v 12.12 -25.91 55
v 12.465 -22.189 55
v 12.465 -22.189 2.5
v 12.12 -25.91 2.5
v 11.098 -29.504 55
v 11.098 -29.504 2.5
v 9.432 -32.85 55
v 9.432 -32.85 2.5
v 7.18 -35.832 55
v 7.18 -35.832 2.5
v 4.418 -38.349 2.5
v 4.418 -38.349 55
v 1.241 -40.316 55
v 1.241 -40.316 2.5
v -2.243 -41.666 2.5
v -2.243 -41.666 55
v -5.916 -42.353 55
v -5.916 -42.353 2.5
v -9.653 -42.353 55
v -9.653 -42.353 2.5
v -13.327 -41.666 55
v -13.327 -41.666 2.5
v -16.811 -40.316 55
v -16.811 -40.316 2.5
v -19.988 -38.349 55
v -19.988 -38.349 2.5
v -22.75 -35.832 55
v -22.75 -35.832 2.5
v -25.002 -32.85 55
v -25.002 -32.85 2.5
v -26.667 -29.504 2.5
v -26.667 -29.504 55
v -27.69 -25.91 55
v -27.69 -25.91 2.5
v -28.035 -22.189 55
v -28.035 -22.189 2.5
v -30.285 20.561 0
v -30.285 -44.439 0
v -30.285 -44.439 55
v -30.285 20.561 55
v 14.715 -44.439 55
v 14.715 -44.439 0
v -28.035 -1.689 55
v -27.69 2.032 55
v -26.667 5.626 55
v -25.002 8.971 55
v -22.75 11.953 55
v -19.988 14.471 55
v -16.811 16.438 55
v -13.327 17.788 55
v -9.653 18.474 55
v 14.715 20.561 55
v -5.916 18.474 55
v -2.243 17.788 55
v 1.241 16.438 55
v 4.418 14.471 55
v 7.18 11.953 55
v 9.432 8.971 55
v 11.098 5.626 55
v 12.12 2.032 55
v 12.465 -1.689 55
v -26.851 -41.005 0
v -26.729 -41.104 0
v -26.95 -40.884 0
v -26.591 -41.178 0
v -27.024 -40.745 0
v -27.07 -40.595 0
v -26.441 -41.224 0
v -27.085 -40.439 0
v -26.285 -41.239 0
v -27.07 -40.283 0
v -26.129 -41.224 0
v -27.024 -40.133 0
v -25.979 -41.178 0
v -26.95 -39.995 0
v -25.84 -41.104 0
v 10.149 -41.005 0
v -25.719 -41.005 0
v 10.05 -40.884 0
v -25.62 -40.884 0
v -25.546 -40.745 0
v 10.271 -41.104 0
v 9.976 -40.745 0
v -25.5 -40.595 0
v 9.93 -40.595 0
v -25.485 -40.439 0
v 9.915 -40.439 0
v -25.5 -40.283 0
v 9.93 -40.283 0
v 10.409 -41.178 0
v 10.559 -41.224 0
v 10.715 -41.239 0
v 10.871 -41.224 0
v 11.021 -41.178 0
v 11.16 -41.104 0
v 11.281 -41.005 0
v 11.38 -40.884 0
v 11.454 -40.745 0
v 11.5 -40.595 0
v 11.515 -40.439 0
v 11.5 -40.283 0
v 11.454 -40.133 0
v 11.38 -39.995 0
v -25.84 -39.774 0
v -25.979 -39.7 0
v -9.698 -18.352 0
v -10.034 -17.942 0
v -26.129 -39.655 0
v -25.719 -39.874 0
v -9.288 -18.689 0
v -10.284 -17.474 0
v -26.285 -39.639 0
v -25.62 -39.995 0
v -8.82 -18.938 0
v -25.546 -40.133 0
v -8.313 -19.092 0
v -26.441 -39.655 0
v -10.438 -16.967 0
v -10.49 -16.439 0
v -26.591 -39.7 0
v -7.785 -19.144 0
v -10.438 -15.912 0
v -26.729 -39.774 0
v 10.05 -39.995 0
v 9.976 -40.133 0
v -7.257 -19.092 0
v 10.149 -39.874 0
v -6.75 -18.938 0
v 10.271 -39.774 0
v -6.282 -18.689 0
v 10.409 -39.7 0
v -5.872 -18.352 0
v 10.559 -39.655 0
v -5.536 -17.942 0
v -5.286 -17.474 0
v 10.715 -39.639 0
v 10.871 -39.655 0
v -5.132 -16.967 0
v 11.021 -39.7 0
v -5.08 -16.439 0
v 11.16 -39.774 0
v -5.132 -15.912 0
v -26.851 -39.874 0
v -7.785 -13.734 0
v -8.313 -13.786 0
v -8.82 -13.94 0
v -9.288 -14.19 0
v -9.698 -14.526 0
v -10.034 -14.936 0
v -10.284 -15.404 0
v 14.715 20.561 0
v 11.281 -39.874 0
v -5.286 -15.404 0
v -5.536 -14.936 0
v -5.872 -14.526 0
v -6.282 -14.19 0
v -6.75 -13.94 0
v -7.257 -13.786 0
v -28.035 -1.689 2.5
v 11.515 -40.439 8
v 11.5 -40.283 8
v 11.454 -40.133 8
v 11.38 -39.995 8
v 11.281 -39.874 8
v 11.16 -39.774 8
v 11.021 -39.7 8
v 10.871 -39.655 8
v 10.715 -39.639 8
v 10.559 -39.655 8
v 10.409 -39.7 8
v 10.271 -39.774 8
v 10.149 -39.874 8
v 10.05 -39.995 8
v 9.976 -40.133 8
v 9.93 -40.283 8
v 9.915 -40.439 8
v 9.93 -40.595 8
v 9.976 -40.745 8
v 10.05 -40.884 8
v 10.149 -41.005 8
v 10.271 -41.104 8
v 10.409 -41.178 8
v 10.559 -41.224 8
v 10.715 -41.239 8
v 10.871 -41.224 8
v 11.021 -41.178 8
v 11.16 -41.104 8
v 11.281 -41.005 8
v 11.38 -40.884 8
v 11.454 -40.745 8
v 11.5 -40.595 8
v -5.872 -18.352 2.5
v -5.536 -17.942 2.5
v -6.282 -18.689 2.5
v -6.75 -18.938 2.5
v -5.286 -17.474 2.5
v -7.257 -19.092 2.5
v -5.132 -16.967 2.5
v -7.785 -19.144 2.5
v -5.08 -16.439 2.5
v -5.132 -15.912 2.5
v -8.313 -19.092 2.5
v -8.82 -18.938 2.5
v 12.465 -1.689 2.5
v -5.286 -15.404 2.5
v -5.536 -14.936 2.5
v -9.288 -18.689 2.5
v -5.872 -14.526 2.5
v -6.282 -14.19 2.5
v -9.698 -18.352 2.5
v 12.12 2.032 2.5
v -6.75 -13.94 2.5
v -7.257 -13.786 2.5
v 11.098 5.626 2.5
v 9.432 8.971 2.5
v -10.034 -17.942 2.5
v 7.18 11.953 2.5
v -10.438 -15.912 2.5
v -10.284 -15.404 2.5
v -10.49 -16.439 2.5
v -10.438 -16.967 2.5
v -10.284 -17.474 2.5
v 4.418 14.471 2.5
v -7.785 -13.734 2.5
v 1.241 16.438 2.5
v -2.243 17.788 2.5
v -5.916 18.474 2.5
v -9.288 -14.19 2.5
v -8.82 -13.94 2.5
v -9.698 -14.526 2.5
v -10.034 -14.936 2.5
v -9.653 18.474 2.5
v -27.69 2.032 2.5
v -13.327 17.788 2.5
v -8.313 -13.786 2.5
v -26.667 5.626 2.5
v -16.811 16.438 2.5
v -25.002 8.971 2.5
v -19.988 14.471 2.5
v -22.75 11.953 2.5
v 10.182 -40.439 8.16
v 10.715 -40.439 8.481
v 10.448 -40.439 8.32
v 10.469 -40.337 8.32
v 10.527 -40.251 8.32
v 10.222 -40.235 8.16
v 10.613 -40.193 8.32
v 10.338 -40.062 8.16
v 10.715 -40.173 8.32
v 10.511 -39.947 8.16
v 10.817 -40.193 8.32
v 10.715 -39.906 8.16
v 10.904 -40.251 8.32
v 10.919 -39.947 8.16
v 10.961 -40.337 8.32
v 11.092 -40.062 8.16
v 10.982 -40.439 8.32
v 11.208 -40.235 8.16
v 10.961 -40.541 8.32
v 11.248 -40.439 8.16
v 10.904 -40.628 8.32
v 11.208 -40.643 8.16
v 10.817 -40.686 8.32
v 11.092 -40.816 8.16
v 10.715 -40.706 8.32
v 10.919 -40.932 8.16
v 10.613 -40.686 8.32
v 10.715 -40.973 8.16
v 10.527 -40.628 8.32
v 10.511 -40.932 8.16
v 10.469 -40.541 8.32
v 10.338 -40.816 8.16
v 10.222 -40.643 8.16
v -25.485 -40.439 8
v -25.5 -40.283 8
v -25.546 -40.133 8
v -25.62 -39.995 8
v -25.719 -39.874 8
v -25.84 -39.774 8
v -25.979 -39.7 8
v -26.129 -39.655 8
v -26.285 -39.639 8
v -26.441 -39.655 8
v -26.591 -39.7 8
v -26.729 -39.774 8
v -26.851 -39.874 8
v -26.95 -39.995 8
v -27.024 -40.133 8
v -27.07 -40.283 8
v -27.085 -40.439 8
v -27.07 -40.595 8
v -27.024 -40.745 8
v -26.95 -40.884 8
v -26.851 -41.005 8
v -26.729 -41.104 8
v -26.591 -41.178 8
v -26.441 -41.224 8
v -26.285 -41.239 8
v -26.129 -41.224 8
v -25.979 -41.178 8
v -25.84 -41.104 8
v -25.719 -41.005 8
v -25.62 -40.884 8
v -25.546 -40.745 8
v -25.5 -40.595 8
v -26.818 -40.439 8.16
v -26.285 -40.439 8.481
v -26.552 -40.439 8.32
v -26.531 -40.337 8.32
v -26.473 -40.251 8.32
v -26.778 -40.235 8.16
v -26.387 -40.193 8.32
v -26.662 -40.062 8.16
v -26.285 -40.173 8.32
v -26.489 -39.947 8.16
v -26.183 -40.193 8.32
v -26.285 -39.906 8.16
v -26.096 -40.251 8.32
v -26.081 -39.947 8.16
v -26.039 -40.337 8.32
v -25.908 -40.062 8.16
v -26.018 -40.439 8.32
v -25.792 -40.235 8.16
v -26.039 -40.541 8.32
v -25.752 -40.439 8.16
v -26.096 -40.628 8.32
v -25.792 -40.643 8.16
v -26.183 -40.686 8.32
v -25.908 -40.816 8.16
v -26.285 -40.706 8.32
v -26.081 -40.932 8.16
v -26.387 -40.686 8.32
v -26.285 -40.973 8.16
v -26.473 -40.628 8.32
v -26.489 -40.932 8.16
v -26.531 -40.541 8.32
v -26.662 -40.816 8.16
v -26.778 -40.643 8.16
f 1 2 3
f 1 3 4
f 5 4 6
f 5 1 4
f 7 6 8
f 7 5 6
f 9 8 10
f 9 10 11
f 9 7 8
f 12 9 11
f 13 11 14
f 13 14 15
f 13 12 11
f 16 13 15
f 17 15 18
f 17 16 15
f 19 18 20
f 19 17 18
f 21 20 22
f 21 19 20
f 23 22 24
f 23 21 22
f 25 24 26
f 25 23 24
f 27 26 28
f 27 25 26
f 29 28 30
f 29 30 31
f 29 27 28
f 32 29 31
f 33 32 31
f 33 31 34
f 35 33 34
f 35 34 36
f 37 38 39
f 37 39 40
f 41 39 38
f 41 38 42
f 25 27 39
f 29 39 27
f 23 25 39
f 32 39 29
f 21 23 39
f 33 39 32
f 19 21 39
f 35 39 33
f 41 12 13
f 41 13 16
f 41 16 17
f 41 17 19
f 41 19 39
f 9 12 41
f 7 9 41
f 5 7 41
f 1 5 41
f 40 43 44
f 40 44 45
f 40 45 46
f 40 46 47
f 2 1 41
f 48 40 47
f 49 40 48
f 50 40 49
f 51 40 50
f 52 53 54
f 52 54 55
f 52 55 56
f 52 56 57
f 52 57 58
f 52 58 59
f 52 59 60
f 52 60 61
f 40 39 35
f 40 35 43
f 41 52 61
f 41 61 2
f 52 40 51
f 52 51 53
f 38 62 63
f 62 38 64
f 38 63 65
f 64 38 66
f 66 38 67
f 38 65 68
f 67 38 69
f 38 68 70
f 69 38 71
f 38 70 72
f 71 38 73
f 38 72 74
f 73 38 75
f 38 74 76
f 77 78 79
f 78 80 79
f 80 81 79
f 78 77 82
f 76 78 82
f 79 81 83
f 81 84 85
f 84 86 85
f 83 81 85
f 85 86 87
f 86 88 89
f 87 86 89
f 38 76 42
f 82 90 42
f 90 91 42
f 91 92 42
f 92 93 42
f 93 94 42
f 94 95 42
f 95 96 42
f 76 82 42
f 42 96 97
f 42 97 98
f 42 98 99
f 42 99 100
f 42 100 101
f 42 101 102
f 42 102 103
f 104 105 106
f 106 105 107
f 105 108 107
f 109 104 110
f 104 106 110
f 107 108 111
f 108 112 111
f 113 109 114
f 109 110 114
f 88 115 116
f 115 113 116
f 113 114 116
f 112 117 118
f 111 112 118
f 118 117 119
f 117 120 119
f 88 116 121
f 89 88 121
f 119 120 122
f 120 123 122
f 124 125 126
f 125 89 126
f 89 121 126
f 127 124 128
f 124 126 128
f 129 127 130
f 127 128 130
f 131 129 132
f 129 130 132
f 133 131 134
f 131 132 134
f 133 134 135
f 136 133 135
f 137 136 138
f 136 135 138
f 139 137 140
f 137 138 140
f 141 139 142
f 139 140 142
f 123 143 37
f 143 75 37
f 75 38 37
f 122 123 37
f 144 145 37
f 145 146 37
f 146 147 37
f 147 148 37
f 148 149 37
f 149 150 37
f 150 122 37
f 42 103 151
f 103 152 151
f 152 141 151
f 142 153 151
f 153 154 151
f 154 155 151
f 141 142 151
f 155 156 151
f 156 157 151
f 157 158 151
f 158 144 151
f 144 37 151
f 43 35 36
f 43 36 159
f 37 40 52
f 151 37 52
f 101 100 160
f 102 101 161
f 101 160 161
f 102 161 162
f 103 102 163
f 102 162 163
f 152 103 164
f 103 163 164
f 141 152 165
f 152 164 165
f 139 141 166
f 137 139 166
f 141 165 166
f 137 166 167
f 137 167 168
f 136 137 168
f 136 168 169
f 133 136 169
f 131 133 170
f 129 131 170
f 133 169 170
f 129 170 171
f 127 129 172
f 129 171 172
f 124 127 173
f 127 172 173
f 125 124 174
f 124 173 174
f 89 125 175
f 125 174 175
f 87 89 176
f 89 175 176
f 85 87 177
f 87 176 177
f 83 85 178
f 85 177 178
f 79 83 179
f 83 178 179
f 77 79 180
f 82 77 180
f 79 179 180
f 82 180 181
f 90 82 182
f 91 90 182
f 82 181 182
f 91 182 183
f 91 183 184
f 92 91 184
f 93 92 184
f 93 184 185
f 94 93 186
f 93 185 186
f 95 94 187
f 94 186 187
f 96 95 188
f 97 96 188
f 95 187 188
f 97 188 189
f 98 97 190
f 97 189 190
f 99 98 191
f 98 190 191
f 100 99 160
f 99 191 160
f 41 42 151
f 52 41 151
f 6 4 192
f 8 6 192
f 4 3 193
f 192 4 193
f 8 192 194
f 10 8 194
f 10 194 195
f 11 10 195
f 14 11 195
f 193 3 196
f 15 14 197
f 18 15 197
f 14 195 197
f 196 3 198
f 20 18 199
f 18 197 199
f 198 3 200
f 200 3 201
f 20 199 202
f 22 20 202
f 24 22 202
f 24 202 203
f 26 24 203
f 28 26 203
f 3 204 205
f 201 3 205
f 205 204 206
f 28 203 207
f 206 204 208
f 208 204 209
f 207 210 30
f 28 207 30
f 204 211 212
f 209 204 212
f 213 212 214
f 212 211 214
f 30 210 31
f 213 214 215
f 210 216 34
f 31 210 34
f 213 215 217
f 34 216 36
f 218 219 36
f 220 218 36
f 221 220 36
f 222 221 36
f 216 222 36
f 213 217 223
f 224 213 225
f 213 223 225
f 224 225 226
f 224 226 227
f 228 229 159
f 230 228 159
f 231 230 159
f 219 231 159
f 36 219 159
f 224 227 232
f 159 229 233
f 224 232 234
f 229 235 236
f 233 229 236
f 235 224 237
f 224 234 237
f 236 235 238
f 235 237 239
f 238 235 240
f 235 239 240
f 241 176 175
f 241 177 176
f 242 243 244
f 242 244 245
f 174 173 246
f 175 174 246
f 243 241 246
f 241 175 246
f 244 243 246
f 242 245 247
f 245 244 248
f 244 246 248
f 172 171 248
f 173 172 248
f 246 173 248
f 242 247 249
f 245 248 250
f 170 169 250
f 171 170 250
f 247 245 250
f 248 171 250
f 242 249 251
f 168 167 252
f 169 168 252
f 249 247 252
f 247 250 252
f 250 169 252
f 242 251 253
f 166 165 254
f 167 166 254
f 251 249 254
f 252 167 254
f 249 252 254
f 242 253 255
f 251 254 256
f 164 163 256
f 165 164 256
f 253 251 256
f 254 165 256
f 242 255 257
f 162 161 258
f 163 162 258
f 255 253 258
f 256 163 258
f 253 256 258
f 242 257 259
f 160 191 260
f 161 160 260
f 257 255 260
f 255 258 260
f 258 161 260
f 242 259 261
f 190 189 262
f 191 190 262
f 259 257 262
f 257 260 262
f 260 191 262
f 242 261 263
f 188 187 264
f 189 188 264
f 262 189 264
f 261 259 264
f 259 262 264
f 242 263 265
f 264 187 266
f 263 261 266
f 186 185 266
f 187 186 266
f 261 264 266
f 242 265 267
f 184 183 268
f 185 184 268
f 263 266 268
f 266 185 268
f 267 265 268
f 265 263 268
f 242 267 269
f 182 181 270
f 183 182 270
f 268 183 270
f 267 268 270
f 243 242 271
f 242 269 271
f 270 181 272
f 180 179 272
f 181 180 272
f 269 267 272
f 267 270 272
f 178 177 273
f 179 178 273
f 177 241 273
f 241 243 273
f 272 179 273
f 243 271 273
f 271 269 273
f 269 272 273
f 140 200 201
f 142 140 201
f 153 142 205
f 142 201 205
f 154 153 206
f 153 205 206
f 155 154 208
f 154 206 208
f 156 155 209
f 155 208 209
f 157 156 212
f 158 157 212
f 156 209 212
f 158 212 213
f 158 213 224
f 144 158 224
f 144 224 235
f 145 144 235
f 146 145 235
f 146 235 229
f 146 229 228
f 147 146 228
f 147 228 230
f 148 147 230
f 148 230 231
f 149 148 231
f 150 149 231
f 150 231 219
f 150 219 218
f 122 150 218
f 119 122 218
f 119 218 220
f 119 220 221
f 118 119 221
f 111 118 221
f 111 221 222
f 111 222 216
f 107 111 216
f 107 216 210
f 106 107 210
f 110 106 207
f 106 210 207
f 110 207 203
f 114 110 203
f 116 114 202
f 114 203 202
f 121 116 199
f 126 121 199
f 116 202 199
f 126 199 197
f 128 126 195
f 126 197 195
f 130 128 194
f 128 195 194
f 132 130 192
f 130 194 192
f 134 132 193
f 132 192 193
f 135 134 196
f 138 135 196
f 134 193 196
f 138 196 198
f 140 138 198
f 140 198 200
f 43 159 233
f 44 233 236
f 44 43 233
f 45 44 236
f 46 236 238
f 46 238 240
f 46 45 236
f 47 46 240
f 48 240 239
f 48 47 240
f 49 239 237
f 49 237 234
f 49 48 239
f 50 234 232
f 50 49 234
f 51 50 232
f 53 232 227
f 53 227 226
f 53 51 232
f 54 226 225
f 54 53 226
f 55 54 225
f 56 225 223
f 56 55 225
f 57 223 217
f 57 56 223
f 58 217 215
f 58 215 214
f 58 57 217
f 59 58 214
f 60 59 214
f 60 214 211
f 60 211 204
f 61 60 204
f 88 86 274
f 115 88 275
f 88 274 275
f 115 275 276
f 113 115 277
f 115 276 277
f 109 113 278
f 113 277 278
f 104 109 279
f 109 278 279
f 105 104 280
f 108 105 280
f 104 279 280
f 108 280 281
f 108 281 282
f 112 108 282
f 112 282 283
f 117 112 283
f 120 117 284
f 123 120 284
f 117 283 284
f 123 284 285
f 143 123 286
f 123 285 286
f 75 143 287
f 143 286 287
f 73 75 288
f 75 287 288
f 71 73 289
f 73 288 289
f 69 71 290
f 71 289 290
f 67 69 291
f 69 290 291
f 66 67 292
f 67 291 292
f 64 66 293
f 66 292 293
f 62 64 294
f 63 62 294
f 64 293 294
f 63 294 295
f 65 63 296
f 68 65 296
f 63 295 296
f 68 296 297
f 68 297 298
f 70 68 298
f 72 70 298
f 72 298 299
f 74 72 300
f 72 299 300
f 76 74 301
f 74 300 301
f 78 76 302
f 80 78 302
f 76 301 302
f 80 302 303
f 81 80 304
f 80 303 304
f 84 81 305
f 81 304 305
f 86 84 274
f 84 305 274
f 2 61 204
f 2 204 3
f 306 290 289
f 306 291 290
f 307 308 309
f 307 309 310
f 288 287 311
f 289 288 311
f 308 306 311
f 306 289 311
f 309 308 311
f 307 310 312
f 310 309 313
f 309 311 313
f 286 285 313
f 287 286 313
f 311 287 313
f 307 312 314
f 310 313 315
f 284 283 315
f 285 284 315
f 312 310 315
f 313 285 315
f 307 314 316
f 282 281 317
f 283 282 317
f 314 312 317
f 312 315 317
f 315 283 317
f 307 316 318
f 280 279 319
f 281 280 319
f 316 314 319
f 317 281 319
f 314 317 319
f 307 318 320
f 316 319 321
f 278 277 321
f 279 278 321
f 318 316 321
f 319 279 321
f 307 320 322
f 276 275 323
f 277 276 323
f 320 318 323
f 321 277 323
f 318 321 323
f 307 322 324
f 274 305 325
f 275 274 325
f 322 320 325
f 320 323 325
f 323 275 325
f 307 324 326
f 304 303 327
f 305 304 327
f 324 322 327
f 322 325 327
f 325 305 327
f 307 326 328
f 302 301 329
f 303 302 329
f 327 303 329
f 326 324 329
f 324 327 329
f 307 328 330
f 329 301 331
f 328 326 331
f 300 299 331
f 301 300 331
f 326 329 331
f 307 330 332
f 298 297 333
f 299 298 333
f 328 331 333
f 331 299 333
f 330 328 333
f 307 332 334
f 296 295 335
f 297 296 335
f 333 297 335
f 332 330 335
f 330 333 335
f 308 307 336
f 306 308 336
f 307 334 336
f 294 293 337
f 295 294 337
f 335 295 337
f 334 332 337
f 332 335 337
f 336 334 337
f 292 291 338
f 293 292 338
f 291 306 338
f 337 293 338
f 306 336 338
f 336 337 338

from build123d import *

# Parameters (mm, degrees)
SKETCH4_W                       = 45
SKETCH4_H                       = 65
BOSS_EXTRUDE2_DEPTH             = 55
CUT_EXTRUDE1_DEPTH              = 52.5
F_1_4_28_TAPPED_HOLE1_D         = 5.4102
TAP_DRILL_FOR_M2X0_4_TAP2_D     = 1.6
TAP_DRILL_FOR_M2X0_4_TAP2_DEPTH = 8
TAP_DRILL_FOR_M2X0_4_TAP2_TIP   = 0.480688495
TAP_DRILL_FOR_M2X0_4_TAP3_D     = 1.6
TAP_DRILL_FOR_M2X0_4_TAP3_DEPTH = 8
TAP_DRILL_FOR_M2X0_4_TAP3_TIP   = 0.480688495


with BuildPart() as part:
    # Sketch4 → Boss-Extrude2 (new body)
    with BuildSketch(Plane.XY):
        with Locations((-7.784904398, -11.939291809)):
            Rectangle(SKETCH4_W, SKETCH4_H)
    extrude(amount=BOSS_EXTRUDE2_DEPTH)

    # Sketch5 → Cut-Extrude1 (cut)
    with BuildSketch(Plane.XY.offset(55)):
        with BuildLine():
            Line((-28.034904398, -22.189291809), (-28.034904398, -1.689291809))
            ThreePointArc((-28.034904398, -1.689291809), (-7.784904398, 18.560708191), (12.465095602, -1.689291809))
            Line((12.465095602, -1.689291809), (12.465095602, -22.189291809))
            ThreePointArc((12.465095602, -22.189291809), (-7.784904398, -42.439291809), (-28.034904398, -22.189291809))
        make_face()
    extrude(amount=-CUT_EXTRUDE1_DEPTH, mode=Mode.SUBTRACT)

    # 1/4-28 Tapped Hole1 (through all)
    with Locations(Plane(origin=(0, 0, 0), x_dir=(-1, 0, 0), z_dir=(0, 0, -1))):
        with Locations((7.784904398, -16.439291809)):
            Hole(F_1_4_28_TAPPED_HOLE1_D / 2)

    # Tap Drill for M2x0.4 Tap2
    with Locations(Plane(origin=(0, 0, 0), x_dir=(-1, 0, 0), z_dir=(0, 0, -1))):
        with Locations((-10.715095602, -40.439291809)):
            Hole(TAP_DRILL_FOR_M2X0_4_TAP2_D / 2, depth=TAP_DRILL_FOR_M2X0_4_TAP2_DEPTH)
            with Locations((0, 0, -(TAP_DRILL_FOR_M2X0_4_TAP2_DEPTH + TAP_DRILL_FOR_M2X0_4_TAP2_TIP / 2))):  # 118° drill point
                Cone(0, TAP_DRILL_FOR_M2X0_4_TAP2_D / 2, TAP_DRILL_FOR_M2X0_4_TAP2_TIP, mode=Mode.SUBTRACT)

    # Tap Drill for M2x0.4 Tap3
    with Locations(Plane(origin=(-26.284904398, -40.439291809, 0), x_dir=(-1, 0, 0), z_dir=(0, 0, -1))):
        with Locations((0, 0)):
            Hole(TAP_DRILL_FOR_M2X0_4_TAP3_D / 2, depth=TAP_DRILL_FOR_M2X0_4_TAP3_DEPTH)
            with Locations((0, 0, -(TAP_DRILL_FOR_M2X0_4_TAP3_DEPTH + TAP_DRILL_FOR_M2X0_4_TAP3_TIP / 2))):  # 118° drill point
                Cone(0, TAP_DRILL_FOR_M2X0_4_TAP3_D / 2, TAP_DRILL_FOR_M2X0_4_TAP3_TIP, mode=Mode.SUBTRACT)


solid = part.part
